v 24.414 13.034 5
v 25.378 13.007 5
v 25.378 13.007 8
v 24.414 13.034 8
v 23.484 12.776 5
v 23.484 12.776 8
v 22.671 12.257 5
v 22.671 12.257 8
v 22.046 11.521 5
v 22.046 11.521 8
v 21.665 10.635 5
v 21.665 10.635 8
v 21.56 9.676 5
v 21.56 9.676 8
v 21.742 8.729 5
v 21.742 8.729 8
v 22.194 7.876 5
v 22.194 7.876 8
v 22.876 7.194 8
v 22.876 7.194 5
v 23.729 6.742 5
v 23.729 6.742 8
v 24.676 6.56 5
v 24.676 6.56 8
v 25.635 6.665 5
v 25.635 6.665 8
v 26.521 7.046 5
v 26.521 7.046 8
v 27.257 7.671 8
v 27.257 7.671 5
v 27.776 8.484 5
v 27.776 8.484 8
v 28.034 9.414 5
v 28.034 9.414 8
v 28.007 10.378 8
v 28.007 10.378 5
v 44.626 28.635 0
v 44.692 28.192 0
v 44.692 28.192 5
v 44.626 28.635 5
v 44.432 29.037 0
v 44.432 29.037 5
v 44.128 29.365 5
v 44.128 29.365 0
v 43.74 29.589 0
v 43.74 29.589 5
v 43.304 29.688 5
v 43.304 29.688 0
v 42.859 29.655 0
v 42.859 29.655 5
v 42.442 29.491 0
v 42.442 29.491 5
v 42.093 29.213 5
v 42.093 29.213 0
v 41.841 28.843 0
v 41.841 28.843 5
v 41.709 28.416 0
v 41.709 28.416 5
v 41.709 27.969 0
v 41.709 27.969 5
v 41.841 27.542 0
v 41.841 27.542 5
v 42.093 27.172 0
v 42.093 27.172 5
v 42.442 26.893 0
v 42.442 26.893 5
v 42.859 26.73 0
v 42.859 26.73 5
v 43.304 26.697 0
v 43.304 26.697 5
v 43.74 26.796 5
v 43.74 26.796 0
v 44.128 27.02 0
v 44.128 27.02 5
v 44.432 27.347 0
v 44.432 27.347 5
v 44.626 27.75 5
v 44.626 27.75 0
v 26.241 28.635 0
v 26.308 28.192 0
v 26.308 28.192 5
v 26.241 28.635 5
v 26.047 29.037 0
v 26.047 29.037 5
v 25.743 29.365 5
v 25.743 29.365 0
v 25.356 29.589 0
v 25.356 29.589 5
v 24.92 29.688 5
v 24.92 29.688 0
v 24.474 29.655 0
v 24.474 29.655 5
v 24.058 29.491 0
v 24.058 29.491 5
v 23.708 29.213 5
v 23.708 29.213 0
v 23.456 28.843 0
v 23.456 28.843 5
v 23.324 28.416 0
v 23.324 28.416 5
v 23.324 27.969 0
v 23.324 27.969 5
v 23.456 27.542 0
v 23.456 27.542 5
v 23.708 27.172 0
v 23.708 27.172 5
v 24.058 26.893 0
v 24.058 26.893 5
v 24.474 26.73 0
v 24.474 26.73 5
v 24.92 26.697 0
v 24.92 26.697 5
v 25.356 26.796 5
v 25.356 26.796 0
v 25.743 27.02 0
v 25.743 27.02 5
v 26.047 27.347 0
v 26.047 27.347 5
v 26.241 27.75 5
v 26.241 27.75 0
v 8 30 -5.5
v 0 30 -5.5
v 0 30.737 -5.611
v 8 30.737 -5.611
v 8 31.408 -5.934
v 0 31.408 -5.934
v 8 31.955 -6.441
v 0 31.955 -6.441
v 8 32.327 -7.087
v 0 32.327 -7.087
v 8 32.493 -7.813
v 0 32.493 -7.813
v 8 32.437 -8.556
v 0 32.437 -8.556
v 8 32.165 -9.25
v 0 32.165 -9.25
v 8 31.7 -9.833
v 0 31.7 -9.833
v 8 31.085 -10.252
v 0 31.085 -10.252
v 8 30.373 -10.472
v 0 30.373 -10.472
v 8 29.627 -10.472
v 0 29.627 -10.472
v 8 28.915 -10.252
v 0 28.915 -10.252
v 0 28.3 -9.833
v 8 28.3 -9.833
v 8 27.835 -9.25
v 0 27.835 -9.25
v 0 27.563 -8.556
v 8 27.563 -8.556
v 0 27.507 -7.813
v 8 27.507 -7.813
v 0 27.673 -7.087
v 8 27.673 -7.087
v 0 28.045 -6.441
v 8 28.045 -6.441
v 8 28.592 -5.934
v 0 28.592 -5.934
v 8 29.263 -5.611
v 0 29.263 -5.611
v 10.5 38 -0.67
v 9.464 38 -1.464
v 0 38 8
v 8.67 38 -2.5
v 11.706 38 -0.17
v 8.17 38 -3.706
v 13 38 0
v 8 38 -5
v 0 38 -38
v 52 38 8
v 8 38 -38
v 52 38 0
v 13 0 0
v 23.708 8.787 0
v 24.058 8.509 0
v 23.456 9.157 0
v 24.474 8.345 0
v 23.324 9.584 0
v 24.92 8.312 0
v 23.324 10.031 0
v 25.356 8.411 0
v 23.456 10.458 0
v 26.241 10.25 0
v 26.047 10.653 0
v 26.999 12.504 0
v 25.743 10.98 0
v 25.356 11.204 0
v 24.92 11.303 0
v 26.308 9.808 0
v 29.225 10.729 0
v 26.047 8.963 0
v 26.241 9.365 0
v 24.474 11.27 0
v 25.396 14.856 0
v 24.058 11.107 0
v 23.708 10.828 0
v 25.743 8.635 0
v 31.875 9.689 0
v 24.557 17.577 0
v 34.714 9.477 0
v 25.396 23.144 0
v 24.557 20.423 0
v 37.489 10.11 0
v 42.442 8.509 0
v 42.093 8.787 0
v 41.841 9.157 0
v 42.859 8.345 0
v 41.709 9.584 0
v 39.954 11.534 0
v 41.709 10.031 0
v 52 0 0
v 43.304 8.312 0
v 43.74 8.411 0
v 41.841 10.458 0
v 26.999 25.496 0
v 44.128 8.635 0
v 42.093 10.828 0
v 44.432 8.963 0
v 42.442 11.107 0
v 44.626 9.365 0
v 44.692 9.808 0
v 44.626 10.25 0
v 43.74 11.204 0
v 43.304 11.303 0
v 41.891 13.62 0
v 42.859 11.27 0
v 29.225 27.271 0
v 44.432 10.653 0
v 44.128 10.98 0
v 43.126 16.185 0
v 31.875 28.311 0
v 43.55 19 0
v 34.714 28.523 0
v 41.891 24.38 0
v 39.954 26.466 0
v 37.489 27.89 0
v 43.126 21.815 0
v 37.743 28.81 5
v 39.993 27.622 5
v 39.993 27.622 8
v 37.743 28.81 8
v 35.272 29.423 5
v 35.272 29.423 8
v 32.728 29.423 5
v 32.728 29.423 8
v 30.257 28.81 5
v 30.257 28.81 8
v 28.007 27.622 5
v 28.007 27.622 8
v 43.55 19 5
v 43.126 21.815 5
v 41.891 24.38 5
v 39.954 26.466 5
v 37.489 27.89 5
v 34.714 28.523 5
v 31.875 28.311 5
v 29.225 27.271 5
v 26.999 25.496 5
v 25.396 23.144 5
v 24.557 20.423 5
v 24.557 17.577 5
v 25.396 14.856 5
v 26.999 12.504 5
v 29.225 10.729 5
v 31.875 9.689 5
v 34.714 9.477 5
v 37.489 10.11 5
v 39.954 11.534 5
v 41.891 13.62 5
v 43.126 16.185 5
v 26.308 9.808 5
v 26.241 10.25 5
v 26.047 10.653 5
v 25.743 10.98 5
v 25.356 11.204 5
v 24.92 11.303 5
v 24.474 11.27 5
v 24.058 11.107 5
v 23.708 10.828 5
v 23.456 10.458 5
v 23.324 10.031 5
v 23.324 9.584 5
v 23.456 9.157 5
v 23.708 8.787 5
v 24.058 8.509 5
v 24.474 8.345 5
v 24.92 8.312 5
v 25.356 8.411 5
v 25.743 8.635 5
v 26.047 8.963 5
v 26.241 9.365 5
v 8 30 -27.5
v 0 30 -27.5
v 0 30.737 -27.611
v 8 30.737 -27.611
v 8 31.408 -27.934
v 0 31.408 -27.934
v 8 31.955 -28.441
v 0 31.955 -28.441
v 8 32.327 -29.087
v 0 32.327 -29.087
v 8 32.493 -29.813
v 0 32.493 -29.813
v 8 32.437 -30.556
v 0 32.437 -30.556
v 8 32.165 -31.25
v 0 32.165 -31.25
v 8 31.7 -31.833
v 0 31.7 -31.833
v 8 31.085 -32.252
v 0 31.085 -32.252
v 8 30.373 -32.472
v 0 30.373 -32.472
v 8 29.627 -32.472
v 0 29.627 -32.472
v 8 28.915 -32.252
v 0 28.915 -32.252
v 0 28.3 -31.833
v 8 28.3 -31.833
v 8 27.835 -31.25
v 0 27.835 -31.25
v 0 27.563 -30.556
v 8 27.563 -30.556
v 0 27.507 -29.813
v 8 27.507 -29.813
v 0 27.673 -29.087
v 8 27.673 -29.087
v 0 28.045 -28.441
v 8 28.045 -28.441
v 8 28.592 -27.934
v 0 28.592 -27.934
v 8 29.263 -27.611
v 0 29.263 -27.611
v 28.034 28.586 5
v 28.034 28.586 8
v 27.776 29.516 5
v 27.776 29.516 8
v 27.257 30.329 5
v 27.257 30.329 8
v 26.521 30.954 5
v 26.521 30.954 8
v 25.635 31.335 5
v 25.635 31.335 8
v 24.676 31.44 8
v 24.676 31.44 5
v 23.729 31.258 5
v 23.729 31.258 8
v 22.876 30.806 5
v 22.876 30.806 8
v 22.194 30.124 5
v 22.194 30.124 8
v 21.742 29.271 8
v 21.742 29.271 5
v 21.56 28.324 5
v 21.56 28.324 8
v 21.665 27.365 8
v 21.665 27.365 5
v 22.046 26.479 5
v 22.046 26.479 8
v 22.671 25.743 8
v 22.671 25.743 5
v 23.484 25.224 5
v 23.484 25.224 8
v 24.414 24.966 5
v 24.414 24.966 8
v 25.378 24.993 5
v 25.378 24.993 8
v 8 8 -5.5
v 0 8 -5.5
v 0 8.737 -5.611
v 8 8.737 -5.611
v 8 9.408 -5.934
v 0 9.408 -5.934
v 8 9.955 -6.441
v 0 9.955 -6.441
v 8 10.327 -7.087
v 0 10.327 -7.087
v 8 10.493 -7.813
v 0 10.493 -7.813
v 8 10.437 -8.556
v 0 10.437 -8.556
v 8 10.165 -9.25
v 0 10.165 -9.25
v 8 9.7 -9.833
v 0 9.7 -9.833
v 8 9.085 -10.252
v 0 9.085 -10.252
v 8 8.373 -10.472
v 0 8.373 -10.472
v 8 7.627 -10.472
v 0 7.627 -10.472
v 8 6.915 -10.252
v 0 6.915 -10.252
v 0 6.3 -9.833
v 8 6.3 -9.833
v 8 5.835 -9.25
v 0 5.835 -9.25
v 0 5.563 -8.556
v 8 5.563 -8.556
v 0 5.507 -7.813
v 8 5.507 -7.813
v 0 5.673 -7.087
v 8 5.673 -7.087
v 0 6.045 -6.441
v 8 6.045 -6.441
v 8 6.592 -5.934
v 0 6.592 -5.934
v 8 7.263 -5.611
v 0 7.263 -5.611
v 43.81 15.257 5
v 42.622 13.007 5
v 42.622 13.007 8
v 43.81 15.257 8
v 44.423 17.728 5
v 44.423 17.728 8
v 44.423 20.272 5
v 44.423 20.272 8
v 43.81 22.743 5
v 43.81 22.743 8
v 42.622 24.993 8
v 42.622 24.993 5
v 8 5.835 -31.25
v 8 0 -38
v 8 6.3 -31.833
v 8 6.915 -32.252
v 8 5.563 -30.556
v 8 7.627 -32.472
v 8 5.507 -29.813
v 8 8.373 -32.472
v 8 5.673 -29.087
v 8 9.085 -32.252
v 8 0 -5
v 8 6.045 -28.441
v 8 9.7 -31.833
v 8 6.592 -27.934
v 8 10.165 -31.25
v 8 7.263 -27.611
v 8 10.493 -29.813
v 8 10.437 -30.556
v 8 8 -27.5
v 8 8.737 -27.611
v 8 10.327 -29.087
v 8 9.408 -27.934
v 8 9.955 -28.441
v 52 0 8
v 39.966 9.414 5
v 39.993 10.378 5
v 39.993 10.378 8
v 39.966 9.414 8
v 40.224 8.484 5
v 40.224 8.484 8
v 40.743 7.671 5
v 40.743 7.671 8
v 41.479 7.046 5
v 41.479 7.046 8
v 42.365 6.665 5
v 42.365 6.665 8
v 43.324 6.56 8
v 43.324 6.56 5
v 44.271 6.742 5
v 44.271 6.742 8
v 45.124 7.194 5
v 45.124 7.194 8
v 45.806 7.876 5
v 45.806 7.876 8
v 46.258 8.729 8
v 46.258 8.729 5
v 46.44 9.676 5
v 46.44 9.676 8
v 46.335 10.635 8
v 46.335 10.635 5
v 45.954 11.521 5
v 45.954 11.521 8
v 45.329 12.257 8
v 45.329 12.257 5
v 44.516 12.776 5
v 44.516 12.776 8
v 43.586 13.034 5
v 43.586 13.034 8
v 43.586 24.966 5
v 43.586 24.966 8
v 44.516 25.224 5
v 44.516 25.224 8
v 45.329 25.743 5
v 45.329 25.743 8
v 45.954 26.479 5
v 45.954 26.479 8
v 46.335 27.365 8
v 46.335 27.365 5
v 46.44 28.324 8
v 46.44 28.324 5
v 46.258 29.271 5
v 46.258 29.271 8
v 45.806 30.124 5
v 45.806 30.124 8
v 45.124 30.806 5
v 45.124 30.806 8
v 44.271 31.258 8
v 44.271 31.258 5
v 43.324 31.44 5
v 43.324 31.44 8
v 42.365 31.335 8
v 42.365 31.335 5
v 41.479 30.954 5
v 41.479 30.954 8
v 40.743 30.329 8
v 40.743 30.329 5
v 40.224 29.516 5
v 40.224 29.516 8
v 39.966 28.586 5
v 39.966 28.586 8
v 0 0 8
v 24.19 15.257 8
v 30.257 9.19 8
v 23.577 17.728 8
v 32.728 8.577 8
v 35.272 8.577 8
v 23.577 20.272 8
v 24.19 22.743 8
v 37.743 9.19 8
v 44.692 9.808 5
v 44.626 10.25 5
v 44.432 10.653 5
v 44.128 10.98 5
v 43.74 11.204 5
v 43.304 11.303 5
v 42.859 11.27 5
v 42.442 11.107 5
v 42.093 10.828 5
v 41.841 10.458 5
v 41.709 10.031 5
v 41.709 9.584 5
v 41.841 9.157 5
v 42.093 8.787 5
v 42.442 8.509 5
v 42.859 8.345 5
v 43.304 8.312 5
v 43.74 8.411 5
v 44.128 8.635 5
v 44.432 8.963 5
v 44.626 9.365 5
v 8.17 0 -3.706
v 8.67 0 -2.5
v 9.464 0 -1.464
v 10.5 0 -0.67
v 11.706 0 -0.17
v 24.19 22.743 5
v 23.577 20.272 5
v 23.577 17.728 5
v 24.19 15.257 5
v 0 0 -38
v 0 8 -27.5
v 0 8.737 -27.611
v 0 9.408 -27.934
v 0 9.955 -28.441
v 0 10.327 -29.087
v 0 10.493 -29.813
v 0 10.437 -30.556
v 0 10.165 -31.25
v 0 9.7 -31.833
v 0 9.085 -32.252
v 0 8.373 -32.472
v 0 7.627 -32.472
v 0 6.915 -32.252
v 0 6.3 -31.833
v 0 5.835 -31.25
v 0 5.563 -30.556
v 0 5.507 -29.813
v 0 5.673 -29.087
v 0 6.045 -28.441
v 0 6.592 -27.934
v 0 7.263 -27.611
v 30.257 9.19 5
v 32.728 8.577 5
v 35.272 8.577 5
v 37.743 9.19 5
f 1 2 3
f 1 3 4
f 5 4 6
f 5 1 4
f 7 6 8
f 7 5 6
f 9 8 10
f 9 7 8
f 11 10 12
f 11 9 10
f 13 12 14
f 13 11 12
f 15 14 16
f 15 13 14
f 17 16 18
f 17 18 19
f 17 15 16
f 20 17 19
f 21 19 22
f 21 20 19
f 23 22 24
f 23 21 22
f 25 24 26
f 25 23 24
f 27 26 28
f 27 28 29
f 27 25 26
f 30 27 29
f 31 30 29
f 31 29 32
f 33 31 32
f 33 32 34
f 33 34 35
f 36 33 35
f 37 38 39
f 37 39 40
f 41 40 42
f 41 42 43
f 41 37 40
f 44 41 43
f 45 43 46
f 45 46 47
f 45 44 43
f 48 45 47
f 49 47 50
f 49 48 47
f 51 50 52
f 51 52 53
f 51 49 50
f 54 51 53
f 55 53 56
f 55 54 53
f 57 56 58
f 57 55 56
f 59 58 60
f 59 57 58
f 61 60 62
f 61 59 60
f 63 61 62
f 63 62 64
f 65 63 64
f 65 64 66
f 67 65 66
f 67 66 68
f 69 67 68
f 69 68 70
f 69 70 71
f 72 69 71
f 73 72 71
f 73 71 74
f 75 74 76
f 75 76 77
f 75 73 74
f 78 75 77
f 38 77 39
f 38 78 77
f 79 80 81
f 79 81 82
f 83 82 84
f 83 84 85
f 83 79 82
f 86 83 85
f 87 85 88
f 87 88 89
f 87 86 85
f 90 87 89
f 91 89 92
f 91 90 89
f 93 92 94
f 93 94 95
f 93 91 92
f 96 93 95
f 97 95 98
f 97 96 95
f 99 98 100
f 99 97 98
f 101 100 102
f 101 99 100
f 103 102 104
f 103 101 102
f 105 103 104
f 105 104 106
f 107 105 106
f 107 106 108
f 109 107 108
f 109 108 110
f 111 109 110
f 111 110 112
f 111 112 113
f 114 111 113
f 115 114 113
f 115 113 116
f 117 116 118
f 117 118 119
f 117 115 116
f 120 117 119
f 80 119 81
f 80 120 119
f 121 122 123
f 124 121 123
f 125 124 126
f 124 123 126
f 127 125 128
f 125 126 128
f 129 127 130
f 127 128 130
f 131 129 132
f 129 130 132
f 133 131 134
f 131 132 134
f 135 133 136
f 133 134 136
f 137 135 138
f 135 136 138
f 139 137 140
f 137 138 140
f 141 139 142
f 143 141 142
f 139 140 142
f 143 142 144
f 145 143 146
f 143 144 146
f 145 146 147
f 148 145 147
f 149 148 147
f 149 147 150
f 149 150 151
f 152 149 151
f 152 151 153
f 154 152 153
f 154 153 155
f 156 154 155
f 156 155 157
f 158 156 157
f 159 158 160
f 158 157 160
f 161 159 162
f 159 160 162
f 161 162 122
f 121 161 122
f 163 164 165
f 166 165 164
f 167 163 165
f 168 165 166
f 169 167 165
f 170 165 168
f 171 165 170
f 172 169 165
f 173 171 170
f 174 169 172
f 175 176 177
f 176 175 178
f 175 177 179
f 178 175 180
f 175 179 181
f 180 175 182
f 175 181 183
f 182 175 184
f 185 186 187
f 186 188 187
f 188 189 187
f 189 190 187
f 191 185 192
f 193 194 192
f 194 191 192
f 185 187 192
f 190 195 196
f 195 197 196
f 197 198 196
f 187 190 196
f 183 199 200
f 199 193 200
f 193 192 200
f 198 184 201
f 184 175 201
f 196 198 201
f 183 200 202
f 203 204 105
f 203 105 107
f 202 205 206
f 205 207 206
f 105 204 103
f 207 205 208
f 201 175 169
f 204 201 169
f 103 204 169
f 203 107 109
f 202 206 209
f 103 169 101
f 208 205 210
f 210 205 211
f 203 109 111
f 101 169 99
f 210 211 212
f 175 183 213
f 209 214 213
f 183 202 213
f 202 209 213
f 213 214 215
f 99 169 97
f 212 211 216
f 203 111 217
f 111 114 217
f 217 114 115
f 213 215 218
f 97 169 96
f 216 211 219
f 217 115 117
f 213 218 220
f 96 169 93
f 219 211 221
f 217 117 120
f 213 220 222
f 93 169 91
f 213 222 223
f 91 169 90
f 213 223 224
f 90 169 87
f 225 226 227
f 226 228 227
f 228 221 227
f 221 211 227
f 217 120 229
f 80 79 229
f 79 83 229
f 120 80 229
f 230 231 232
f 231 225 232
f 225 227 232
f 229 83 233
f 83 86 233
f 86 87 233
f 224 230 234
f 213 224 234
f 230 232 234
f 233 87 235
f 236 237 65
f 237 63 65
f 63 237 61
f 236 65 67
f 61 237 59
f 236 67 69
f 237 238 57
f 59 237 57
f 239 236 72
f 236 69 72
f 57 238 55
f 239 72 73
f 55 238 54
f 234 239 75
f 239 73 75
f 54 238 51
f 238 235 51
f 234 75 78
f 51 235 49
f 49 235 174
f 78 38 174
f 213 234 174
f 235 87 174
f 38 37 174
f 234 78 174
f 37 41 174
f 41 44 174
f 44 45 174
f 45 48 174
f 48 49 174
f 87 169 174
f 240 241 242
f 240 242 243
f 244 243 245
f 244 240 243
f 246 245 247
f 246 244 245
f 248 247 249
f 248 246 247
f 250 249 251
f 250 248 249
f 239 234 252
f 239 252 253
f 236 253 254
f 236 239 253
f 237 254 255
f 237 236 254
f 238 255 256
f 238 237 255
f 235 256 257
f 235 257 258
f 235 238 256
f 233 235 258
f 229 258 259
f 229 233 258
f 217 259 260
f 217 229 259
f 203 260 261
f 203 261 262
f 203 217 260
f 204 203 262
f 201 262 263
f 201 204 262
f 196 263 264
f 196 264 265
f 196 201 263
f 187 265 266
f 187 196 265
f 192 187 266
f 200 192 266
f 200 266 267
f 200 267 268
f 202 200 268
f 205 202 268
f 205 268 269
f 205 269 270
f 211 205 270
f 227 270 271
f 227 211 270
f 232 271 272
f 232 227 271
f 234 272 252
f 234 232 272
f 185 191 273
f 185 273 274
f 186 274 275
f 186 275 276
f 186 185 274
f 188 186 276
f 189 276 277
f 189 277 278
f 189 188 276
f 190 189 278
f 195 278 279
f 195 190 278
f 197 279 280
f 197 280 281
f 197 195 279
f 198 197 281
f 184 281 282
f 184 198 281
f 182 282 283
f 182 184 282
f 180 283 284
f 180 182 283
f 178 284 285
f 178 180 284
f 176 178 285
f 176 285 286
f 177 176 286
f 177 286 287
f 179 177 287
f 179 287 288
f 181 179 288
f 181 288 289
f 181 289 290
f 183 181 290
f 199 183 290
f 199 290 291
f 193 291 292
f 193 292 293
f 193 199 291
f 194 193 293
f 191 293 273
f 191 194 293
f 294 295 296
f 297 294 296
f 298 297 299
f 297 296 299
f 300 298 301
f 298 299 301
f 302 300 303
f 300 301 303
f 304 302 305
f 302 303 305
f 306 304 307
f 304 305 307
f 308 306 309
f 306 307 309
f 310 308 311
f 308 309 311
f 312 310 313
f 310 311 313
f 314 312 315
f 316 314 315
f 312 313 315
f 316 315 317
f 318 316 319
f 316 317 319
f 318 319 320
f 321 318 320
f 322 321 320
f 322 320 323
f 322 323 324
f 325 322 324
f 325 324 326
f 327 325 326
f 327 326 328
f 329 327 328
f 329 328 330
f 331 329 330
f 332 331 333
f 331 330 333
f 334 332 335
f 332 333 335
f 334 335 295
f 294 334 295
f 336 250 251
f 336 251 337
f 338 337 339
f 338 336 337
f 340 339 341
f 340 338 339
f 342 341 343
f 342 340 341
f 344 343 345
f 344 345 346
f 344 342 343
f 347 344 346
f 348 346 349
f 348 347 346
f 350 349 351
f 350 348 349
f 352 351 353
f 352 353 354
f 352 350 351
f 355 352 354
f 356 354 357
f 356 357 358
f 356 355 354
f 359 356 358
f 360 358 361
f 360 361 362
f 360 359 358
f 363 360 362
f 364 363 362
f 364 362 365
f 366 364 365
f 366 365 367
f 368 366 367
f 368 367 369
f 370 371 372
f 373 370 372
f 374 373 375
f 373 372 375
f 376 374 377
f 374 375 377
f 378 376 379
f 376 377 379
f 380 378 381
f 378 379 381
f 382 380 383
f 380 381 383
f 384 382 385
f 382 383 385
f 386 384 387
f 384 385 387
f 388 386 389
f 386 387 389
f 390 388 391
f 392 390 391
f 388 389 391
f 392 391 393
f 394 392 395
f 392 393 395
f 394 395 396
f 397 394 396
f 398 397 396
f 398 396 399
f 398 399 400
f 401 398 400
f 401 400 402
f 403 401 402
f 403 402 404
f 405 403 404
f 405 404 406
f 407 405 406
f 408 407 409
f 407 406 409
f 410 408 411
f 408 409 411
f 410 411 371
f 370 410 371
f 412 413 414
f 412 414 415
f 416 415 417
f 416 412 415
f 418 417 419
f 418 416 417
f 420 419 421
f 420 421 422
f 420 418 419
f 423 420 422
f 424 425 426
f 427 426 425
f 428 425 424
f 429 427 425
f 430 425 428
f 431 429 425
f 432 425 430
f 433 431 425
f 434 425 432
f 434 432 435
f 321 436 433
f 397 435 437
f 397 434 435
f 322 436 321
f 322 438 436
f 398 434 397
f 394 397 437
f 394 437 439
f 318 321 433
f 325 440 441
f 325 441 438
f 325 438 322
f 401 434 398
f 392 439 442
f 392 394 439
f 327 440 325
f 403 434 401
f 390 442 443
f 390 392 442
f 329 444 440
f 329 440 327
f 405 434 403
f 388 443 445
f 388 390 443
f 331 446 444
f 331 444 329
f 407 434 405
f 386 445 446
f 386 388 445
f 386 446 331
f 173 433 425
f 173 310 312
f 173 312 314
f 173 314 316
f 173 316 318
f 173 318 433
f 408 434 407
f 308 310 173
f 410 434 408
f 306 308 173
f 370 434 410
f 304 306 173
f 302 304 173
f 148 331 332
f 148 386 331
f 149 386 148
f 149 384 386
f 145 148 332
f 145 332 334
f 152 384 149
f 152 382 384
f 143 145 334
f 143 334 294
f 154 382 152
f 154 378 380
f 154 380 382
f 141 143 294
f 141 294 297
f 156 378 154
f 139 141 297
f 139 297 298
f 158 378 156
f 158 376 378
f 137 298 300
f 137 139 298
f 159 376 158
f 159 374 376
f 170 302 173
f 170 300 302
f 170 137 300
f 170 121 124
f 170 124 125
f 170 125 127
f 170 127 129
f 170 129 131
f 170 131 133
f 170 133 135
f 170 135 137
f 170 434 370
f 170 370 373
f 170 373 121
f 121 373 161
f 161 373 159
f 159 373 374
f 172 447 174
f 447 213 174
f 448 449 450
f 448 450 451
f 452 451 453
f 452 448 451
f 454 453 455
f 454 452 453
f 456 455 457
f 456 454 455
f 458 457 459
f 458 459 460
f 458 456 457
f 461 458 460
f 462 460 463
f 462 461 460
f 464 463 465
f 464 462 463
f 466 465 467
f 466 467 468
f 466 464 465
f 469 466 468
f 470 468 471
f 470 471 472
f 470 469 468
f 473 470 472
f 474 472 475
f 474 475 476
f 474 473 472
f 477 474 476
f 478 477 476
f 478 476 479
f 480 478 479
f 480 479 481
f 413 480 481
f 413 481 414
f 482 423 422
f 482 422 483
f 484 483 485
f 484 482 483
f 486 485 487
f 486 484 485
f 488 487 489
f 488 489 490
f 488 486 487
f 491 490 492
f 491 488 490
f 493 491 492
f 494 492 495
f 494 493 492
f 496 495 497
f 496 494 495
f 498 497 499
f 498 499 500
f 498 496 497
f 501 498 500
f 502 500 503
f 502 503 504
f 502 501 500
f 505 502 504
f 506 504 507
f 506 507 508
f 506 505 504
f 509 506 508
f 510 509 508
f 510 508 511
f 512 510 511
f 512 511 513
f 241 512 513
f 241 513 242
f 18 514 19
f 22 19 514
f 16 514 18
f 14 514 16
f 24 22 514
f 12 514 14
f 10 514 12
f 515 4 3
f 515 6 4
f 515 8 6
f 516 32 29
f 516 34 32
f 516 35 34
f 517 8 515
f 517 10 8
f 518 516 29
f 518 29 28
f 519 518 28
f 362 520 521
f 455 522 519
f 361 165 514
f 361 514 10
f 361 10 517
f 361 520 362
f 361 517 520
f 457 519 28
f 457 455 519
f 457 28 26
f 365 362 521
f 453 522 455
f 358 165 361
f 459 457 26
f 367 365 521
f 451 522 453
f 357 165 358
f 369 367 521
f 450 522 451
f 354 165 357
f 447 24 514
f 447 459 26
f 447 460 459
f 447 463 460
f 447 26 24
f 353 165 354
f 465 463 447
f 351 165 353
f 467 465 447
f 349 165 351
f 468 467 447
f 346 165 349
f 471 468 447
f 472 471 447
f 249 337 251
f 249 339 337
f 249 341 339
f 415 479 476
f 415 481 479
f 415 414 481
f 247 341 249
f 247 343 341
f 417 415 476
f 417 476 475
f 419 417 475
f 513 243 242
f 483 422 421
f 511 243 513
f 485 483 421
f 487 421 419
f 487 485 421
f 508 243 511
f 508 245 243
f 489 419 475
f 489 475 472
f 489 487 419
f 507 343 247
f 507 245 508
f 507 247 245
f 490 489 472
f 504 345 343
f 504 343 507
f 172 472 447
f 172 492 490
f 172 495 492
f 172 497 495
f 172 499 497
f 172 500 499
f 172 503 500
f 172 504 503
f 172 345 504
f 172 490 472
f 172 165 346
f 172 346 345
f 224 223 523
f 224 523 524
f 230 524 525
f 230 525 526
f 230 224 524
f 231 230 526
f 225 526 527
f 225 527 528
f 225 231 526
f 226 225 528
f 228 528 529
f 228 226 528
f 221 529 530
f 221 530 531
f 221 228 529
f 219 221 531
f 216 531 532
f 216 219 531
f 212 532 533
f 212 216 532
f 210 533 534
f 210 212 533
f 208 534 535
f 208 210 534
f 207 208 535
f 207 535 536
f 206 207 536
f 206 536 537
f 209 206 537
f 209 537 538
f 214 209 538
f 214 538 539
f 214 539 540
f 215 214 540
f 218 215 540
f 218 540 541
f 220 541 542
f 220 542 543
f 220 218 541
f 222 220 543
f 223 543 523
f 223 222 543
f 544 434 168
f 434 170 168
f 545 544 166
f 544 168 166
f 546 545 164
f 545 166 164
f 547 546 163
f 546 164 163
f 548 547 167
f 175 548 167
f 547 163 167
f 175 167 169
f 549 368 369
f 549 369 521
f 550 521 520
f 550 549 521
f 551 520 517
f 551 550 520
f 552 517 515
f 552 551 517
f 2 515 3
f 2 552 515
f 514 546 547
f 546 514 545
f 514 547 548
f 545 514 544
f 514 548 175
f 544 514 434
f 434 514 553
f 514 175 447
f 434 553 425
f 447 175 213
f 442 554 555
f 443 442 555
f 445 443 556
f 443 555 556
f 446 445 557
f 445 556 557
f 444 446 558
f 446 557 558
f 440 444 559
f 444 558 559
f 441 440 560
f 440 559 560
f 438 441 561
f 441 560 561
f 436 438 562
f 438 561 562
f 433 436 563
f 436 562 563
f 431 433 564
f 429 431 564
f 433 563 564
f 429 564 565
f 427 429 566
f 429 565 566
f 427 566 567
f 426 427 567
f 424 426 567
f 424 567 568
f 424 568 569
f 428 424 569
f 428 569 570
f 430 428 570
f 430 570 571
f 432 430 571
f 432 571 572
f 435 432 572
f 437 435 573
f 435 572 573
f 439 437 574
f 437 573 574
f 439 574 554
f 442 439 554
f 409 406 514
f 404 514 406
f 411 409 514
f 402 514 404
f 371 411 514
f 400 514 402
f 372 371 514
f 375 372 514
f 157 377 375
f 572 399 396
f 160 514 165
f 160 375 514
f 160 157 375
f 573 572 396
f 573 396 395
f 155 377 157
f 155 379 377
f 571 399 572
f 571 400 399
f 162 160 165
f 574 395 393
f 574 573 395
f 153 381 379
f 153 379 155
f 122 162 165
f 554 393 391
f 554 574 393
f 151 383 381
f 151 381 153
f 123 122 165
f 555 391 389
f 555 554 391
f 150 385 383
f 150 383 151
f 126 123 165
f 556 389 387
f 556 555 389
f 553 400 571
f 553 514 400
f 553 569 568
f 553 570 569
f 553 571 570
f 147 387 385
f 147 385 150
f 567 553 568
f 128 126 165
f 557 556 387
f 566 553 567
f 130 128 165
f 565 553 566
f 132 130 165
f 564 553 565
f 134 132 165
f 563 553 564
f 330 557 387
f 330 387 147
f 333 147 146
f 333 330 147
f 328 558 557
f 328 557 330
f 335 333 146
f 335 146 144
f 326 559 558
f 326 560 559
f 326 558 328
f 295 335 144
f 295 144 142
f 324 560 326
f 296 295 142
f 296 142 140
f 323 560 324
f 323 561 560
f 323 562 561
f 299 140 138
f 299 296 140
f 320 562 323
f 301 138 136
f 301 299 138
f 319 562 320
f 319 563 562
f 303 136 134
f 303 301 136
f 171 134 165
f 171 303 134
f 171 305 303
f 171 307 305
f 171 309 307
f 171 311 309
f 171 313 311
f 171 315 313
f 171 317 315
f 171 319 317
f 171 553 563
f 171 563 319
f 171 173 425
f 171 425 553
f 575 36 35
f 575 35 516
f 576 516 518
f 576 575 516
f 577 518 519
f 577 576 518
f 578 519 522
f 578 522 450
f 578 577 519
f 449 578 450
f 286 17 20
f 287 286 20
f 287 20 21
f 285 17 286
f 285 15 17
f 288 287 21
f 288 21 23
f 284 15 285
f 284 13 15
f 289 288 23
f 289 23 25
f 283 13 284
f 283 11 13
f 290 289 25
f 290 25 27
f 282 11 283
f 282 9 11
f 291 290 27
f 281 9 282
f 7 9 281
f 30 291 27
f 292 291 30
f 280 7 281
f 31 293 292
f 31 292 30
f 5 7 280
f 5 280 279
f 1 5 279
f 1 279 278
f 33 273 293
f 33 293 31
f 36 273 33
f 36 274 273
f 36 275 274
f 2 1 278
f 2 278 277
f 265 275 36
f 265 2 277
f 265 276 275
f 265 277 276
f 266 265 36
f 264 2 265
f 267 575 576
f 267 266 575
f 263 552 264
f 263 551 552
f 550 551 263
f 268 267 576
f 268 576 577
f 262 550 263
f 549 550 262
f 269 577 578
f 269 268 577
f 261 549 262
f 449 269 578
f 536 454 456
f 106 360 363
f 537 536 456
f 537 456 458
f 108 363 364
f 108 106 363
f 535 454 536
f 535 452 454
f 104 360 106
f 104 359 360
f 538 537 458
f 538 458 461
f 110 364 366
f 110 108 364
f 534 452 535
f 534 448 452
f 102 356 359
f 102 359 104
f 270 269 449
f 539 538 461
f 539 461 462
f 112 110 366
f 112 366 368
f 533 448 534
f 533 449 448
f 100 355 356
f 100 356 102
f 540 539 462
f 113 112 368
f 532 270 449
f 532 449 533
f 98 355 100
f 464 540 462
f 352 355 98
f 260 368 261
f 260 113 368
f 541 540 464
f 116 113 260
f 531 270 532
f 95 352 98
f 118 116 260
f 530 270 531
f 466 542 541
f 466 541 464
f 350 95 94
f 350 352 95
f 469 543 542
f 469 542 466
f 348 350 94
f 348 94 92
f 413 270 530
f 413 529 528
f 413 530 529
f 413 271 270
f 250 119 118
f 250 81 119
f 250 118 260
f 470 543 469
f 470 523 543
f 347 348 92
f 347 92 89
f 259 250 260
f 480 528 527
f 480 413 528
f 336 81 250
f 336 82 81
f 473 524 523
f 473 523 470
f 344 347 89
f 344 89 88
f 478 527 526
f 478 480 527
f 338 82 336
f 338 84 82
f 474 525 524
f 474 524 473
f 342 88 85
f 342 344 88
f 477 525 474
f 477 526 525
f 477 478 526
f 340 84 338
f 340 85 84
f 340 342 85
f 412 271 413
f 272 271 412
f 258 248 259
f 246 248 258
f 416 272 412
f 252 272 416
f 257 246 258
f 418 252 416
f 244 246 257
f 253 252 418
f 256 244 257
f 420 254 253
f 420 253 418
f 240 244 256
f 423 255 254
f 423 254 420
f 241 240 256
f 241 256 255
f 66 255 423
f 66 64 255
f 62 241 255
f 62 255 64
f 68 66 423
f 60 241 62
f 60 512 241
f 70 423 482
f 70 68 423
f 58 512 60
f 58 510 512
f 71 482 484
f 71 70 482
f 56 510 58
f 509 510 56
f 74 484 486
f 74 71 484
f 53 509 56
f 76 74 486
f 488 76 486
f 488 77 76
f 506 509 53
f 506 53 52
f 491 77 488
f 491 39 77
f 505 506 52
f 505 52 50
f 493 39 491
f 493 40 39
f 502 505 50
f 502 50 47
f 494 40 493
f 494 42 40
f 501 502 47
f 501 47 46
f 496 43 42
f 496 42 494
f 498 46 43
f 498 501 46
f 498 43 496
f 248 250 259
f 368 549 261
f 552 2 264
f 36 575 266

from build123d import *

# Parameters (mm, degrees)
SKETCH1_W         = 52
SKETCH1_H         = 38
SKETCH1_R         = 1.5
SKETCH1_R_2       = 9.55
FACE_IN_DEPTH     = 5
SKETCH8_W         = 8
SKETCH8_H         = 38
BOTTOM_DEPTH      = 38
FILLET1_R         = 5
SKETCH10_W        = 52
SKETCH10_H        = 38
FACE_OUT_DEPTH    = 3
SKETCH12_R        = 2.5
SCREW_HOLES_DEPTH = 8


with BuildPart() as part:
    # Sketch1 → Face_In (new body)
    with BuildSketch(Plane.XY):
        with Locations((26, 19)):
            Rectangle(SKETCH1_W, SKETCH1_H)
        with Locations((43.192388155, 28.192388155)):
            Circle(SKETCH1_R, mode=Mode.SUBTRACT)
        with Locations((43.192388155, 9.807611845)):
            Circle(SKETCH1_R, mode=Mode.SUBTRACT)
        with Locations((24.807611845, 9.807611845)):
            Circle(SKETCH1_R, mode=Mode.SUBTRACT)
        with Locations((24.807611845, 28.192388155)):
            Circle(SKETCH1_R, mode=Mode.SUBTRACT)
        with Locations((34, 19)):
            Circle(SKETCH1_R_2, mode=Mode.SUBTRACT)
    extrude(amount=FACE_IN_DEPTH)

    # Sketch8 → Bottom (add)
    with BuildSketch(Plane(origin=(0, 0, 0), x_dir=(-1, 0, 0), z_dir=(0, 0, -1))):
        with Locations((-4, 19)):
            Rectangle(SKETCH8_W, SKETCH8_H)
    extrude(amount=BOTTOM_DEPTH)

    # Fillet1
    fillet1_edges = [part.edges().sort_by_distance(p)[0] for p in [
        (8, 19, 0),
    ]]
    fillet(fillet1_edges, radius=FILLET1_R)

    # Sketch10 → Face_Out (add)
    with BuildSketch(Plane.XY.offset(5)):
        with Locations((26, 19)):
            Rectangle(SKETCH10_W, SKETCH10_H)
        with BuildLine():
            ThreePointArc((42.621806472, 24.992866856), (45.490485194, 30.490485194), (39.992866856, 27.621806472))
            ThreePointArc((39.992866856, 27.621806472), (34, 29.5), (28.007133144, 27.621806472))
            ThreePointArc((28.007133144, 27.621806472), (22.509514806, 30.490485194), (25.378193528, 24.992866856))
            ThreePointArc((25.378193528, 24.992866856), (23.5, 19), (25.378193528, 13.007133144))
            ThreePointArc((25.378193528, 13.007133144), (22.509514806, 7.509514806), (28.007133144, 10.378193528))
            ThreePointArc((28.007133144, 10.378193528), (34, 8.5), (39.992866856, 10.378193528))
            ThreePointArc((39.992866856, 10.378193528), (45.490485194, 7.509514806), (42.621806472, 13.007133144))
            ThreePointArc((42.621806472, 13.007133144), (44.5, 19), (42.621806472, 24.992866856))
        make_face(mode=Mode.SUBTRACT)
    extrude(amount=FACE_OUT_DEPTH)

    # Sketch12 → Screw Holes (cut)
    with BuildSketch(Plane.ZY):
        with Locations((-8, 30)):
            Circle(SKETCH12_R)
        with Locations((-30, 30)):
            Circle(SKETCH12_R)
        with Locations((-8, 8)):
            Circle(SKETCH12_R)
        with Locations((-30, 8)):
            Circle(SKETCH12_R)
    extrude(amount=-SCREW_HOLES_DEPTH, mode=Mode.SUBTRACT)


solid = part.part
